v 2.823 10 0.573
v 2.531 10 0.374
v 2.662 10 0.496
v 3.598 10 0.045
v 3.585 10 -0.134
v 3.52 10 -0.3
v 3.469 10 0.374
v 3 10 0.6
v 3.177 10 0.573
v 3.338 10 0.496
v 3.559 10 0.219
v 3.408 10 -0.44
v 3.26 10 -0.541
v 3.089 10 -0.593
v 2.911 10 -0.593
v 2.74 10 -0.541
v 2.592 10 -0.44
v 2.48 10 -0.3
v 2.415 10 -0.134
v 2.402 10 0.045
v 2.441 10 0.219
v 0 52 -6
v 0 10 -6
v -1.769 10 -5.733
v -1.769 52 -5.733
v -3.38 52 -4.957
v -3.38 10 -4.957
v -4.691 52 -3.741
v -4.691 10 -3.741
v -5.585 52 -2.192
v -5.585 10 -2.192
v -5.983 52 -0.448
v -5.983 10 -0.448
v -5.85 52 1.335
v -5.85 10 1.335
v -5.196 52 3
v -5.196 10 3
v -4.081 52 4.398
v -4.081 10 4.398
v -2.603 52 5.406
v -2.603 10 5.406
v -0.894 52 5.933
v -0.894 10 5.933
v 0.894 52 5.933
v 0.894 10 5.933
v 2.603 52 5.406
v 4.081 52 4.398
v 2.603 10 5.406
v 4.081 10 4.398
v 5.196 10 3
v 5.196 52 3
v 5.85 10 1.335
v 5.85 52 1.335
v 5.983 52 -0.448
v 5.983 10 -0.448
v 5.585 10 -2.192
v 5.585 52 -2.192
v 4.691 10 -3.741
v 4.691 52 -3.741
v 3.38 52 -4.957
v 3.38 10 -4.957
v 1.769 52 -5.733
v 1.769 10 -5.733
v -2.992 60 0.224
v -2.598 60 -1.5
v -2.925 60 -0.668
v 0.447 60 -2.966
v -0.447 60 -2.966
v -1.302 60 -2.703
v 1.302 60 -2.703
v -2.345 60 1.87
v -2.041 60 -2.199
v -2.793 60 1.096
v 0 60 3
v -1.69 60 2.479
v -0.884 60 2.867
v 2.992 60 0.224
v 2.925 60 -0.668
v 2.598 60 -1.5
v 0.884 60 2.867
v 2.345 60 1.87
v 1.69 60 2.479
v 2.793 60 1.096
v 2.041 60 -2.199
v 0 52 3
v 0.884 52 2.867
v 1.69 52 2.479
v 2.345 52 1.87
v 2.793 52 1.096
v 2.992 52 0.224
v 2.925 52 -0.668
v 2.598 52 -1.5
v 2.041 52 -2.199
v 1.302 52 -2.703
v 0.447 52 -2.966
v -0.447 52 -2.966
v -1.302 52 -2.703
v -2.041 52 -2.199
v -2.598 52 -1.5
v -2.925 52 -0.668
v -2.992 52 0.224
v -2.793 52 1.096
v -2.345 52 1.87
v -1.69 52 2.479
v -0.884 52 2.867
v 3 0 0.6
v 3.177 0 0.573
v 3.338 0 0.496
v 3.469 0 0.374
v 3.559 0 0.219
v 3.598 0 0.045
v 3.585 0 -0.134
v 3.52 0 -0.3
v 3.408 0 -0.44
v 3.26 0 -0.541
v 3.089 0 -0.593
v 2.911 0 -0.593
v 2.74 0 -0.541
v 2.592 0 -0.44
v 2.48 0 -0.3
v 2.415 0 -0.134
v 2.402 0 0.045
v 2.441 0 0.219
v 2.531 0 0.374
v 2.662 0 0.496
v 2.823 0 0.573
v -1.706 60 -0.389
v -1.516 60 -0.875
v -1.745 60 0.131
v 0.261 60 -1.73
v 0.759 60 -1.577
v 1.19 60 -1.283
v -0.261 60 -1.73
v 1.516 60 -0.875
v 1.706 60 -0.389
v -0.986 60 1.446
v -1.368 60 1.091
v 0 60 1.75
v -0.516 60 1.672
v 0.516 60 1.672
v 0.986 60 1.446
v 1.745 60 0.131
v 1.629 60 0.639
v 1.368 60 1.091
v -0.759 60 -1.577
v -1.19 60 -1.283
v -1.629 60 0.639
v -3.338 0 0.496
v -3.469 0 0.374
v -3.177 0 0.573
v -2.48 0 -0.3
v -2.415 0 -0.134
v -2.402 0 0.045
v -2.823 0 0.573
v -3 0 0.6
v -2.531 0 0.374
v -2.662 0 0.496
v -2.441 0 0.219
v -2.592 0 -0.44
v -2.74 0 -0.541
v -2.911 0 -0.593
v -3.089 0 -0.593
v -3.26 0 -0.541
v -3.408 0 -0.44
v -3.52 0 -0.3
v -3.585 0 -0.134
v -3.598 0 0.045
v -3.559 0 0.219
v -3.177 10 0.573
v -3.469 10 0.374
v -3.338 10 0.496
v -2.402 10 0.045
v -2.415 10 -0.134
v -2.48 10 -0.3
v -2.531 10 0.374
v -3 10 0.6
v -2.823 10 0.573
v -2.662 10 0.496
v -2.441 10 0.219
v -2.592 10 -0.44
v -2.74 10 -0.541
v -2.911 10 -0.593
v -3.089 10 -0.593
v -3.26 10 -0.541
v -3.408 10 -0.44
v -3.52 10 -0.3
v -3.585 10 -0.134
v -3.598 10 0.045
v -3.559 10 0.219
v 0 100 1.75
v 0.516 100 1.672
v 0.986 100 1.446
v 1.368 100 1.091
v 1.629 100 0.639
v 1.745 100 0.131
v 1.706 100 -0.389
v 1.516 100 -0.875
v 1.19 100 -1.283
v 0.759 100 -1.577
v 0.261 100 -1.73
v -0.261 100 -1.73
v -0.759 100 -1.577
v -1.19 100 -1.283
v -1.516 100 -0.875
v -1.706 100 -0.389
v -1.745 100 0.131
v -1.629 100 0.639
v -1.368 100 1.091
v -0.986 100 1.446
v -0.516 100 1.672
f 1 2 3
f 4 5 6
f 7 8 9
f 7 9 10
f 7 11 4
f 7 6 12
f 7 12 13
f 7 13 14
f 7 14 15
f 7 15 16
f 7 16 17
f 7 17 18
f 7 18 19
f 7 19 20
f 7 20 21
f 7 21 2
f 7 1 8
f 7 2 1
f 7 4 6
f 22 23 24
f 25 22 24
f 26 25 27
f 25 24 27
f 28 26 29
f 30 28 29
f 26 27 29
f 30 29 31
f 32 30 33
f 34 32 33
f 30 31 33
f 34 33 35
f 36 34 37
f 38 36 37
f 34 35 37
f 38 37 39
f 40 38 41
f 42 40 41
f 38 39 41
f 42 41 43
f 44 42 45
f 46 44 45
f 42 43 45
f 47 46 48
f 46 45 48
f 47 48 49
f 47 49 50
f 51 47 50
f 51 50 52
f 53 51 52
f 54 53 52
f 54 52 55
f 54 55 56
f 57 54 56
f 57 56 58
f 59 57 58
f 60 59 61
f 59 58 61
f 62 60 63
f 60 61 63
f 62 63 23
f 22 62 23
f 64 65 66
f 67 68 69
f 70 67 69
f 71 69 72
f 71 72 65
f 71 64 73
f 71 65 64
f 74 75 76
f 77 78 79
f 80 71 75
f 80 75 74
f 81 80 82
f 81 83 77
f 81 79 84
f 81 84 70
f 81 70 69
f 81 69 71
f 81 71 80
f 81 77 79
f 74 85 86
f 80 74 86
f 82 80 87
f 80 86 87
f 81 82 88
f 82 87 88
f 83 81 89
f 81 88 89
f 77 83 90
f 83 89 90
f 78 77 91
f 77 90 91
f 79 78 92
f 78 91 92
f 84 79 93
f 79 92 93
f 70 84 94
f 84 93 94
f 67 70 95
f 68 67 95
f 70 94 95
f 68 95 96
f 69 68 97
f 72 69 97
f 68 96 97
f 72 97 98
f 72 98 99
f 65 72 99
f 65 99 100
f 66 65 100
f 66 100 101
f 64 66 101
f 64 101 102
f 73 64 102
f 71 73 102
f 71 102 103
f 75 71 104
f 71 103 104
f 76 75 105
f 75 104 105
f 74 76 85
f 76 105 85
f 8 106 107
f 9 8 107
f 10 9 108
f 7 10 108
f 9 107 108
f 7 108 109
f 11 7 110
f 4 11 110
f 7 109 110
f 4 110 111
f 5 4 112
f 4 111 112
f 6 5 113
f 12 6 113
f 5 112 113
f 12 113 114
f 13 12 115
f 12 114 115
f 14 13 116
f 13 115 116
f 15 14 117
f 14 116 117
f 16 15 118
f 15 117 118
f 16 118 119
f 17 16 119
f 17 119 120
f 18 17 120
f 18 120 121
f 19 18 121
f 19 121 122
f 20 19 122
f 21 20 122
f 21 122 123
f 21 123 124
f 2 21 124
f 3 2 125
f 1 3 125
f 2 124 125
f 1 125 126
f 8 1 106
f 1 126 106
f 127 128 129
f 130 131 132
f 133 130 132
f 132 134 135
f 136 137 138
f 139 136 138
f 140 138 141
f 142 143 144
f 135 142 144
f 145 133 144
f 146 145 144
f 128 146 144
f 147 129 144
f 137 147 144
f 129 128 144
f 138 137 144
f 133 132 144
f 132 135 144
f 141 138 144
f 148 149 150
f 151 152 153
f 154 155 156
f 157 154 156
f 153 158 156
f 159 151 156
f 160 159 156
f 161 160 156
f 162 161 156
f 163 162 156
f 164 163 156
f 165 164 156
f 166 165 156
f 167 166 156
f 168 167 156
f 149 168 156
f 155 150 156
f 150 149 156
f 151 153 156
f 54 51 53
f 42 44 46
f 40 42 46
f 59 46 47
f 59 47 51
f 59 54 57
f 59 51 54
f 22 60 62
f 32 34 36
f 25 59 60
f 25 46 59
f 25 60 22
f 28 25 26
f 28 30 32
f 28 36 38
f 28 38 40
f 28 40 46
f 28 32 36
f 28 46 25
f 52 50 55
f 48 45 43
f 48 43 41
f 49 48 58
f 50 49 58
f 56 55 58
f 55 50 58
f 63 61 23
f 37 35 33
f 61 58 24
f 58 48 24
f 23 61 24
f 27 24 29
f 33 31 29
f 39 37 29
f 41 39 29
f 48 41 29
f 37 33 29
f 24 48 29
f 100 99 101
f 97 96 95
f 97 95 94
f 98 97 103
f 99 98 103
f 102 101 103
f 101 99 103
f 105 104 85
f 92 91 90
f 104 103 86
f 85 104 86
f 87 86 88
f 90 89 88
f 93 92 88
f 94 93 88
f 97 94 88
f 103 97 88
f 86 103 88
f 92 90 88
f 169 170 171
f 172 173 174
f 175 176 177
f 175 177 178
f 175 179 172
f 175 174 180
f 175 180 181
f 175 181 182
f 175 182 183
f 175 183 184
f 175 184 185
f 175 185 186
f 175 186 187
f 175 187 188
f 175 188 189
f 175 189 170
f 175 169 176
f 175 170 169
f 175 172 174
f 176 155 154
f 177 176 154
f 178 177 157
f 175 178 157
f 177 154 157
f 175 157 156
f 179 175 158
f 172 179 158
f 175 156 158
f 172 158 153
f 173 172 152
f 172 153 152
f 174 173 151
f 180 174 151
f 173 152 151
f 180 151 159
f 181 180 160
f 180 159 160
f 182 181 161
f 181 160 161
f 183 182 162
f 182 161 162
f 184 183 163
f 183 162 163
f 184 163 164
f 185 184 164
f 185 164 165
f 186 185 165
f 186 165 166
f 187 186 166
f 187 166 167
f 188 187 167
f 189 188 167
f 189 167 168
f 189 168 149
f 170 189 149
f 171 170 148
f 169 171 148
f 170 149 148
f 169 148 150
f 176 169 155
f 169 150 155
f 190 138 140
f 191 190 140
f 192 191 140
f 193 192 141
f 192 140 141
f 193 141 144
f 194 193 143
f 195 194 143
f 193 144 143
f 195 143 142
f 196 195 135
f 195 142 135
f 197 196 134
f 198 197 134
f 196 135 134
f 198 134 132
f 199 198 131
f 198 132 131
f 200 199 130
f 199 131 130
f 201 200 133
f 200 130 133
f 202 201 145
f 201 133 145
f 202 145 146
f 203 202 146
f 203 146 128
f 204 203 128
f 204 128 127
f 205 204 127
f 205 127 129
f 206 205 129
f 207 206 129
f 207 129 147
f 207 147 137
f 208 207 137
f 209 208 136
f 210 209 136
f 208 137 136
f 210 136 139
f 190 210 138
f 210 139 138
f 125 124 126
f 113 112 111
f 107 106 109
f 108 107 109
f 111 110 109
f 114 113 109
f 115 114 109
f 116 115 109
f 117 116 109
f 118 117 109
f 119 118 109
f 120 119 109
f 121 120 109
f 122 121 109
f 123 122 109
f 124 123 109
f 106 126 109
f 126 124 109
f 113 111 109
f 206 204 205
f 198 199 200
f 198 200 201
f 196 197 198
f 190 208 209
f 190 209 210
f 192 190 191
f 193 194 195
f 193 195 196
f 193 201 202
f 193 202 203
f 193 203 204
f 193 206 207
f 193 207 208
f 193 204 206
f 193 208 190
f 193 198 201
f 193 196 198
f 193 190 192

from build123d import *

# Parameters (mm, degrees)
SK_ELECTRODE_PINS_R    = 0.6
ELECTRODE_PINS_DEPTH   = 10
ELECTRODE_PINS_2_DEPTH = 10
PROBE_START            = 10
SK_PROBE_BODY_R        = 6
PROBE_BODY_DEPTH       = 42
STRAIN_START           = 52
SK_STRAIN_RELIEF_R     = 3
STRAIN_RELIEF_DEPTH    = 8
CABLE_START            = 60
SK_CABLE_R             = 1.75
CABLE_DEPTH            = 40


with BuildPart() as part:
    # SK Electrode pins → Electrode pins (new body)
    with BuildSketch(Plane(origin=(0, 0, 0), x_dir=(1, 0, 0), z_dir=(0, 1, 0))):
        with Locations(Location((-3, 0, 0), (0, 0, 270))):
            Circle(SK_ELECTRODE_PINS_R)
    extrude(amount=ELECTRODE_PINS_DEPTH)


with BuildPart() as body_2:
    # SK Electrode pins → Electrode pins 2 (new body)
    with BuildSketch(Plane(origin=(0, 0, 0), x_dir=(1, 0, 0), z_dir=(0, 1, 0))):
        with Locations(Location((3, 0, 0), (0, 0, 270))):
            Circle(SK_ELECTRODE_PINS_R)
    extrude(amount=ELECTRODE_PINS_2_DEPTH)


with BuildPart() as body_3:
    # SK Probe body → Probe body (new body)
    with BuildSketch(Plane(origin=(0, 0, 0), x_dir=(1, 0, 0), z_dir=(0, 1, 0)).offset(PROBE_START)):
        with Locations(Location((0, 0, 0), (0, 0, 90))):
            Circle(SK_PROBE_BODY_R)
    extrude(amount=PROBE_BODY_DEPTH)


with BuildPart() as body_4:
    # SK Strain relief → Strain relief (new body)
    with BuildSketch(Plane(origin=(0, 0, 0), x_dir=(1, 0, 0), z_dir=(0, 1, 0)).offset(STRAIN_START)):
        with Locations(Location((0, 0, 0), (0, 0, 270))):
            Circle(SK_STRAIN_RELIEF_R)
    extrude(amount=STRAIN_RELIEF_DEPTH)


with BuildPart() as body_5:
    # SK Cable → Cable (new body)
    with BuildSketch(Plane(origin=(0, 0, 0), x_dir=(1, 0, 0), z_dir=(0, 1, 0)).offset(CABLE_START)):
        with Locations(Location((0, 0, 0), (0, 0, 270))):
            Circle(SK_CABLE_R)
    extrude(amount=CABLE_DEPTH)


solid = Compound([part.part, body_2.part, body_3.part, body_4.part, body_5.part])
